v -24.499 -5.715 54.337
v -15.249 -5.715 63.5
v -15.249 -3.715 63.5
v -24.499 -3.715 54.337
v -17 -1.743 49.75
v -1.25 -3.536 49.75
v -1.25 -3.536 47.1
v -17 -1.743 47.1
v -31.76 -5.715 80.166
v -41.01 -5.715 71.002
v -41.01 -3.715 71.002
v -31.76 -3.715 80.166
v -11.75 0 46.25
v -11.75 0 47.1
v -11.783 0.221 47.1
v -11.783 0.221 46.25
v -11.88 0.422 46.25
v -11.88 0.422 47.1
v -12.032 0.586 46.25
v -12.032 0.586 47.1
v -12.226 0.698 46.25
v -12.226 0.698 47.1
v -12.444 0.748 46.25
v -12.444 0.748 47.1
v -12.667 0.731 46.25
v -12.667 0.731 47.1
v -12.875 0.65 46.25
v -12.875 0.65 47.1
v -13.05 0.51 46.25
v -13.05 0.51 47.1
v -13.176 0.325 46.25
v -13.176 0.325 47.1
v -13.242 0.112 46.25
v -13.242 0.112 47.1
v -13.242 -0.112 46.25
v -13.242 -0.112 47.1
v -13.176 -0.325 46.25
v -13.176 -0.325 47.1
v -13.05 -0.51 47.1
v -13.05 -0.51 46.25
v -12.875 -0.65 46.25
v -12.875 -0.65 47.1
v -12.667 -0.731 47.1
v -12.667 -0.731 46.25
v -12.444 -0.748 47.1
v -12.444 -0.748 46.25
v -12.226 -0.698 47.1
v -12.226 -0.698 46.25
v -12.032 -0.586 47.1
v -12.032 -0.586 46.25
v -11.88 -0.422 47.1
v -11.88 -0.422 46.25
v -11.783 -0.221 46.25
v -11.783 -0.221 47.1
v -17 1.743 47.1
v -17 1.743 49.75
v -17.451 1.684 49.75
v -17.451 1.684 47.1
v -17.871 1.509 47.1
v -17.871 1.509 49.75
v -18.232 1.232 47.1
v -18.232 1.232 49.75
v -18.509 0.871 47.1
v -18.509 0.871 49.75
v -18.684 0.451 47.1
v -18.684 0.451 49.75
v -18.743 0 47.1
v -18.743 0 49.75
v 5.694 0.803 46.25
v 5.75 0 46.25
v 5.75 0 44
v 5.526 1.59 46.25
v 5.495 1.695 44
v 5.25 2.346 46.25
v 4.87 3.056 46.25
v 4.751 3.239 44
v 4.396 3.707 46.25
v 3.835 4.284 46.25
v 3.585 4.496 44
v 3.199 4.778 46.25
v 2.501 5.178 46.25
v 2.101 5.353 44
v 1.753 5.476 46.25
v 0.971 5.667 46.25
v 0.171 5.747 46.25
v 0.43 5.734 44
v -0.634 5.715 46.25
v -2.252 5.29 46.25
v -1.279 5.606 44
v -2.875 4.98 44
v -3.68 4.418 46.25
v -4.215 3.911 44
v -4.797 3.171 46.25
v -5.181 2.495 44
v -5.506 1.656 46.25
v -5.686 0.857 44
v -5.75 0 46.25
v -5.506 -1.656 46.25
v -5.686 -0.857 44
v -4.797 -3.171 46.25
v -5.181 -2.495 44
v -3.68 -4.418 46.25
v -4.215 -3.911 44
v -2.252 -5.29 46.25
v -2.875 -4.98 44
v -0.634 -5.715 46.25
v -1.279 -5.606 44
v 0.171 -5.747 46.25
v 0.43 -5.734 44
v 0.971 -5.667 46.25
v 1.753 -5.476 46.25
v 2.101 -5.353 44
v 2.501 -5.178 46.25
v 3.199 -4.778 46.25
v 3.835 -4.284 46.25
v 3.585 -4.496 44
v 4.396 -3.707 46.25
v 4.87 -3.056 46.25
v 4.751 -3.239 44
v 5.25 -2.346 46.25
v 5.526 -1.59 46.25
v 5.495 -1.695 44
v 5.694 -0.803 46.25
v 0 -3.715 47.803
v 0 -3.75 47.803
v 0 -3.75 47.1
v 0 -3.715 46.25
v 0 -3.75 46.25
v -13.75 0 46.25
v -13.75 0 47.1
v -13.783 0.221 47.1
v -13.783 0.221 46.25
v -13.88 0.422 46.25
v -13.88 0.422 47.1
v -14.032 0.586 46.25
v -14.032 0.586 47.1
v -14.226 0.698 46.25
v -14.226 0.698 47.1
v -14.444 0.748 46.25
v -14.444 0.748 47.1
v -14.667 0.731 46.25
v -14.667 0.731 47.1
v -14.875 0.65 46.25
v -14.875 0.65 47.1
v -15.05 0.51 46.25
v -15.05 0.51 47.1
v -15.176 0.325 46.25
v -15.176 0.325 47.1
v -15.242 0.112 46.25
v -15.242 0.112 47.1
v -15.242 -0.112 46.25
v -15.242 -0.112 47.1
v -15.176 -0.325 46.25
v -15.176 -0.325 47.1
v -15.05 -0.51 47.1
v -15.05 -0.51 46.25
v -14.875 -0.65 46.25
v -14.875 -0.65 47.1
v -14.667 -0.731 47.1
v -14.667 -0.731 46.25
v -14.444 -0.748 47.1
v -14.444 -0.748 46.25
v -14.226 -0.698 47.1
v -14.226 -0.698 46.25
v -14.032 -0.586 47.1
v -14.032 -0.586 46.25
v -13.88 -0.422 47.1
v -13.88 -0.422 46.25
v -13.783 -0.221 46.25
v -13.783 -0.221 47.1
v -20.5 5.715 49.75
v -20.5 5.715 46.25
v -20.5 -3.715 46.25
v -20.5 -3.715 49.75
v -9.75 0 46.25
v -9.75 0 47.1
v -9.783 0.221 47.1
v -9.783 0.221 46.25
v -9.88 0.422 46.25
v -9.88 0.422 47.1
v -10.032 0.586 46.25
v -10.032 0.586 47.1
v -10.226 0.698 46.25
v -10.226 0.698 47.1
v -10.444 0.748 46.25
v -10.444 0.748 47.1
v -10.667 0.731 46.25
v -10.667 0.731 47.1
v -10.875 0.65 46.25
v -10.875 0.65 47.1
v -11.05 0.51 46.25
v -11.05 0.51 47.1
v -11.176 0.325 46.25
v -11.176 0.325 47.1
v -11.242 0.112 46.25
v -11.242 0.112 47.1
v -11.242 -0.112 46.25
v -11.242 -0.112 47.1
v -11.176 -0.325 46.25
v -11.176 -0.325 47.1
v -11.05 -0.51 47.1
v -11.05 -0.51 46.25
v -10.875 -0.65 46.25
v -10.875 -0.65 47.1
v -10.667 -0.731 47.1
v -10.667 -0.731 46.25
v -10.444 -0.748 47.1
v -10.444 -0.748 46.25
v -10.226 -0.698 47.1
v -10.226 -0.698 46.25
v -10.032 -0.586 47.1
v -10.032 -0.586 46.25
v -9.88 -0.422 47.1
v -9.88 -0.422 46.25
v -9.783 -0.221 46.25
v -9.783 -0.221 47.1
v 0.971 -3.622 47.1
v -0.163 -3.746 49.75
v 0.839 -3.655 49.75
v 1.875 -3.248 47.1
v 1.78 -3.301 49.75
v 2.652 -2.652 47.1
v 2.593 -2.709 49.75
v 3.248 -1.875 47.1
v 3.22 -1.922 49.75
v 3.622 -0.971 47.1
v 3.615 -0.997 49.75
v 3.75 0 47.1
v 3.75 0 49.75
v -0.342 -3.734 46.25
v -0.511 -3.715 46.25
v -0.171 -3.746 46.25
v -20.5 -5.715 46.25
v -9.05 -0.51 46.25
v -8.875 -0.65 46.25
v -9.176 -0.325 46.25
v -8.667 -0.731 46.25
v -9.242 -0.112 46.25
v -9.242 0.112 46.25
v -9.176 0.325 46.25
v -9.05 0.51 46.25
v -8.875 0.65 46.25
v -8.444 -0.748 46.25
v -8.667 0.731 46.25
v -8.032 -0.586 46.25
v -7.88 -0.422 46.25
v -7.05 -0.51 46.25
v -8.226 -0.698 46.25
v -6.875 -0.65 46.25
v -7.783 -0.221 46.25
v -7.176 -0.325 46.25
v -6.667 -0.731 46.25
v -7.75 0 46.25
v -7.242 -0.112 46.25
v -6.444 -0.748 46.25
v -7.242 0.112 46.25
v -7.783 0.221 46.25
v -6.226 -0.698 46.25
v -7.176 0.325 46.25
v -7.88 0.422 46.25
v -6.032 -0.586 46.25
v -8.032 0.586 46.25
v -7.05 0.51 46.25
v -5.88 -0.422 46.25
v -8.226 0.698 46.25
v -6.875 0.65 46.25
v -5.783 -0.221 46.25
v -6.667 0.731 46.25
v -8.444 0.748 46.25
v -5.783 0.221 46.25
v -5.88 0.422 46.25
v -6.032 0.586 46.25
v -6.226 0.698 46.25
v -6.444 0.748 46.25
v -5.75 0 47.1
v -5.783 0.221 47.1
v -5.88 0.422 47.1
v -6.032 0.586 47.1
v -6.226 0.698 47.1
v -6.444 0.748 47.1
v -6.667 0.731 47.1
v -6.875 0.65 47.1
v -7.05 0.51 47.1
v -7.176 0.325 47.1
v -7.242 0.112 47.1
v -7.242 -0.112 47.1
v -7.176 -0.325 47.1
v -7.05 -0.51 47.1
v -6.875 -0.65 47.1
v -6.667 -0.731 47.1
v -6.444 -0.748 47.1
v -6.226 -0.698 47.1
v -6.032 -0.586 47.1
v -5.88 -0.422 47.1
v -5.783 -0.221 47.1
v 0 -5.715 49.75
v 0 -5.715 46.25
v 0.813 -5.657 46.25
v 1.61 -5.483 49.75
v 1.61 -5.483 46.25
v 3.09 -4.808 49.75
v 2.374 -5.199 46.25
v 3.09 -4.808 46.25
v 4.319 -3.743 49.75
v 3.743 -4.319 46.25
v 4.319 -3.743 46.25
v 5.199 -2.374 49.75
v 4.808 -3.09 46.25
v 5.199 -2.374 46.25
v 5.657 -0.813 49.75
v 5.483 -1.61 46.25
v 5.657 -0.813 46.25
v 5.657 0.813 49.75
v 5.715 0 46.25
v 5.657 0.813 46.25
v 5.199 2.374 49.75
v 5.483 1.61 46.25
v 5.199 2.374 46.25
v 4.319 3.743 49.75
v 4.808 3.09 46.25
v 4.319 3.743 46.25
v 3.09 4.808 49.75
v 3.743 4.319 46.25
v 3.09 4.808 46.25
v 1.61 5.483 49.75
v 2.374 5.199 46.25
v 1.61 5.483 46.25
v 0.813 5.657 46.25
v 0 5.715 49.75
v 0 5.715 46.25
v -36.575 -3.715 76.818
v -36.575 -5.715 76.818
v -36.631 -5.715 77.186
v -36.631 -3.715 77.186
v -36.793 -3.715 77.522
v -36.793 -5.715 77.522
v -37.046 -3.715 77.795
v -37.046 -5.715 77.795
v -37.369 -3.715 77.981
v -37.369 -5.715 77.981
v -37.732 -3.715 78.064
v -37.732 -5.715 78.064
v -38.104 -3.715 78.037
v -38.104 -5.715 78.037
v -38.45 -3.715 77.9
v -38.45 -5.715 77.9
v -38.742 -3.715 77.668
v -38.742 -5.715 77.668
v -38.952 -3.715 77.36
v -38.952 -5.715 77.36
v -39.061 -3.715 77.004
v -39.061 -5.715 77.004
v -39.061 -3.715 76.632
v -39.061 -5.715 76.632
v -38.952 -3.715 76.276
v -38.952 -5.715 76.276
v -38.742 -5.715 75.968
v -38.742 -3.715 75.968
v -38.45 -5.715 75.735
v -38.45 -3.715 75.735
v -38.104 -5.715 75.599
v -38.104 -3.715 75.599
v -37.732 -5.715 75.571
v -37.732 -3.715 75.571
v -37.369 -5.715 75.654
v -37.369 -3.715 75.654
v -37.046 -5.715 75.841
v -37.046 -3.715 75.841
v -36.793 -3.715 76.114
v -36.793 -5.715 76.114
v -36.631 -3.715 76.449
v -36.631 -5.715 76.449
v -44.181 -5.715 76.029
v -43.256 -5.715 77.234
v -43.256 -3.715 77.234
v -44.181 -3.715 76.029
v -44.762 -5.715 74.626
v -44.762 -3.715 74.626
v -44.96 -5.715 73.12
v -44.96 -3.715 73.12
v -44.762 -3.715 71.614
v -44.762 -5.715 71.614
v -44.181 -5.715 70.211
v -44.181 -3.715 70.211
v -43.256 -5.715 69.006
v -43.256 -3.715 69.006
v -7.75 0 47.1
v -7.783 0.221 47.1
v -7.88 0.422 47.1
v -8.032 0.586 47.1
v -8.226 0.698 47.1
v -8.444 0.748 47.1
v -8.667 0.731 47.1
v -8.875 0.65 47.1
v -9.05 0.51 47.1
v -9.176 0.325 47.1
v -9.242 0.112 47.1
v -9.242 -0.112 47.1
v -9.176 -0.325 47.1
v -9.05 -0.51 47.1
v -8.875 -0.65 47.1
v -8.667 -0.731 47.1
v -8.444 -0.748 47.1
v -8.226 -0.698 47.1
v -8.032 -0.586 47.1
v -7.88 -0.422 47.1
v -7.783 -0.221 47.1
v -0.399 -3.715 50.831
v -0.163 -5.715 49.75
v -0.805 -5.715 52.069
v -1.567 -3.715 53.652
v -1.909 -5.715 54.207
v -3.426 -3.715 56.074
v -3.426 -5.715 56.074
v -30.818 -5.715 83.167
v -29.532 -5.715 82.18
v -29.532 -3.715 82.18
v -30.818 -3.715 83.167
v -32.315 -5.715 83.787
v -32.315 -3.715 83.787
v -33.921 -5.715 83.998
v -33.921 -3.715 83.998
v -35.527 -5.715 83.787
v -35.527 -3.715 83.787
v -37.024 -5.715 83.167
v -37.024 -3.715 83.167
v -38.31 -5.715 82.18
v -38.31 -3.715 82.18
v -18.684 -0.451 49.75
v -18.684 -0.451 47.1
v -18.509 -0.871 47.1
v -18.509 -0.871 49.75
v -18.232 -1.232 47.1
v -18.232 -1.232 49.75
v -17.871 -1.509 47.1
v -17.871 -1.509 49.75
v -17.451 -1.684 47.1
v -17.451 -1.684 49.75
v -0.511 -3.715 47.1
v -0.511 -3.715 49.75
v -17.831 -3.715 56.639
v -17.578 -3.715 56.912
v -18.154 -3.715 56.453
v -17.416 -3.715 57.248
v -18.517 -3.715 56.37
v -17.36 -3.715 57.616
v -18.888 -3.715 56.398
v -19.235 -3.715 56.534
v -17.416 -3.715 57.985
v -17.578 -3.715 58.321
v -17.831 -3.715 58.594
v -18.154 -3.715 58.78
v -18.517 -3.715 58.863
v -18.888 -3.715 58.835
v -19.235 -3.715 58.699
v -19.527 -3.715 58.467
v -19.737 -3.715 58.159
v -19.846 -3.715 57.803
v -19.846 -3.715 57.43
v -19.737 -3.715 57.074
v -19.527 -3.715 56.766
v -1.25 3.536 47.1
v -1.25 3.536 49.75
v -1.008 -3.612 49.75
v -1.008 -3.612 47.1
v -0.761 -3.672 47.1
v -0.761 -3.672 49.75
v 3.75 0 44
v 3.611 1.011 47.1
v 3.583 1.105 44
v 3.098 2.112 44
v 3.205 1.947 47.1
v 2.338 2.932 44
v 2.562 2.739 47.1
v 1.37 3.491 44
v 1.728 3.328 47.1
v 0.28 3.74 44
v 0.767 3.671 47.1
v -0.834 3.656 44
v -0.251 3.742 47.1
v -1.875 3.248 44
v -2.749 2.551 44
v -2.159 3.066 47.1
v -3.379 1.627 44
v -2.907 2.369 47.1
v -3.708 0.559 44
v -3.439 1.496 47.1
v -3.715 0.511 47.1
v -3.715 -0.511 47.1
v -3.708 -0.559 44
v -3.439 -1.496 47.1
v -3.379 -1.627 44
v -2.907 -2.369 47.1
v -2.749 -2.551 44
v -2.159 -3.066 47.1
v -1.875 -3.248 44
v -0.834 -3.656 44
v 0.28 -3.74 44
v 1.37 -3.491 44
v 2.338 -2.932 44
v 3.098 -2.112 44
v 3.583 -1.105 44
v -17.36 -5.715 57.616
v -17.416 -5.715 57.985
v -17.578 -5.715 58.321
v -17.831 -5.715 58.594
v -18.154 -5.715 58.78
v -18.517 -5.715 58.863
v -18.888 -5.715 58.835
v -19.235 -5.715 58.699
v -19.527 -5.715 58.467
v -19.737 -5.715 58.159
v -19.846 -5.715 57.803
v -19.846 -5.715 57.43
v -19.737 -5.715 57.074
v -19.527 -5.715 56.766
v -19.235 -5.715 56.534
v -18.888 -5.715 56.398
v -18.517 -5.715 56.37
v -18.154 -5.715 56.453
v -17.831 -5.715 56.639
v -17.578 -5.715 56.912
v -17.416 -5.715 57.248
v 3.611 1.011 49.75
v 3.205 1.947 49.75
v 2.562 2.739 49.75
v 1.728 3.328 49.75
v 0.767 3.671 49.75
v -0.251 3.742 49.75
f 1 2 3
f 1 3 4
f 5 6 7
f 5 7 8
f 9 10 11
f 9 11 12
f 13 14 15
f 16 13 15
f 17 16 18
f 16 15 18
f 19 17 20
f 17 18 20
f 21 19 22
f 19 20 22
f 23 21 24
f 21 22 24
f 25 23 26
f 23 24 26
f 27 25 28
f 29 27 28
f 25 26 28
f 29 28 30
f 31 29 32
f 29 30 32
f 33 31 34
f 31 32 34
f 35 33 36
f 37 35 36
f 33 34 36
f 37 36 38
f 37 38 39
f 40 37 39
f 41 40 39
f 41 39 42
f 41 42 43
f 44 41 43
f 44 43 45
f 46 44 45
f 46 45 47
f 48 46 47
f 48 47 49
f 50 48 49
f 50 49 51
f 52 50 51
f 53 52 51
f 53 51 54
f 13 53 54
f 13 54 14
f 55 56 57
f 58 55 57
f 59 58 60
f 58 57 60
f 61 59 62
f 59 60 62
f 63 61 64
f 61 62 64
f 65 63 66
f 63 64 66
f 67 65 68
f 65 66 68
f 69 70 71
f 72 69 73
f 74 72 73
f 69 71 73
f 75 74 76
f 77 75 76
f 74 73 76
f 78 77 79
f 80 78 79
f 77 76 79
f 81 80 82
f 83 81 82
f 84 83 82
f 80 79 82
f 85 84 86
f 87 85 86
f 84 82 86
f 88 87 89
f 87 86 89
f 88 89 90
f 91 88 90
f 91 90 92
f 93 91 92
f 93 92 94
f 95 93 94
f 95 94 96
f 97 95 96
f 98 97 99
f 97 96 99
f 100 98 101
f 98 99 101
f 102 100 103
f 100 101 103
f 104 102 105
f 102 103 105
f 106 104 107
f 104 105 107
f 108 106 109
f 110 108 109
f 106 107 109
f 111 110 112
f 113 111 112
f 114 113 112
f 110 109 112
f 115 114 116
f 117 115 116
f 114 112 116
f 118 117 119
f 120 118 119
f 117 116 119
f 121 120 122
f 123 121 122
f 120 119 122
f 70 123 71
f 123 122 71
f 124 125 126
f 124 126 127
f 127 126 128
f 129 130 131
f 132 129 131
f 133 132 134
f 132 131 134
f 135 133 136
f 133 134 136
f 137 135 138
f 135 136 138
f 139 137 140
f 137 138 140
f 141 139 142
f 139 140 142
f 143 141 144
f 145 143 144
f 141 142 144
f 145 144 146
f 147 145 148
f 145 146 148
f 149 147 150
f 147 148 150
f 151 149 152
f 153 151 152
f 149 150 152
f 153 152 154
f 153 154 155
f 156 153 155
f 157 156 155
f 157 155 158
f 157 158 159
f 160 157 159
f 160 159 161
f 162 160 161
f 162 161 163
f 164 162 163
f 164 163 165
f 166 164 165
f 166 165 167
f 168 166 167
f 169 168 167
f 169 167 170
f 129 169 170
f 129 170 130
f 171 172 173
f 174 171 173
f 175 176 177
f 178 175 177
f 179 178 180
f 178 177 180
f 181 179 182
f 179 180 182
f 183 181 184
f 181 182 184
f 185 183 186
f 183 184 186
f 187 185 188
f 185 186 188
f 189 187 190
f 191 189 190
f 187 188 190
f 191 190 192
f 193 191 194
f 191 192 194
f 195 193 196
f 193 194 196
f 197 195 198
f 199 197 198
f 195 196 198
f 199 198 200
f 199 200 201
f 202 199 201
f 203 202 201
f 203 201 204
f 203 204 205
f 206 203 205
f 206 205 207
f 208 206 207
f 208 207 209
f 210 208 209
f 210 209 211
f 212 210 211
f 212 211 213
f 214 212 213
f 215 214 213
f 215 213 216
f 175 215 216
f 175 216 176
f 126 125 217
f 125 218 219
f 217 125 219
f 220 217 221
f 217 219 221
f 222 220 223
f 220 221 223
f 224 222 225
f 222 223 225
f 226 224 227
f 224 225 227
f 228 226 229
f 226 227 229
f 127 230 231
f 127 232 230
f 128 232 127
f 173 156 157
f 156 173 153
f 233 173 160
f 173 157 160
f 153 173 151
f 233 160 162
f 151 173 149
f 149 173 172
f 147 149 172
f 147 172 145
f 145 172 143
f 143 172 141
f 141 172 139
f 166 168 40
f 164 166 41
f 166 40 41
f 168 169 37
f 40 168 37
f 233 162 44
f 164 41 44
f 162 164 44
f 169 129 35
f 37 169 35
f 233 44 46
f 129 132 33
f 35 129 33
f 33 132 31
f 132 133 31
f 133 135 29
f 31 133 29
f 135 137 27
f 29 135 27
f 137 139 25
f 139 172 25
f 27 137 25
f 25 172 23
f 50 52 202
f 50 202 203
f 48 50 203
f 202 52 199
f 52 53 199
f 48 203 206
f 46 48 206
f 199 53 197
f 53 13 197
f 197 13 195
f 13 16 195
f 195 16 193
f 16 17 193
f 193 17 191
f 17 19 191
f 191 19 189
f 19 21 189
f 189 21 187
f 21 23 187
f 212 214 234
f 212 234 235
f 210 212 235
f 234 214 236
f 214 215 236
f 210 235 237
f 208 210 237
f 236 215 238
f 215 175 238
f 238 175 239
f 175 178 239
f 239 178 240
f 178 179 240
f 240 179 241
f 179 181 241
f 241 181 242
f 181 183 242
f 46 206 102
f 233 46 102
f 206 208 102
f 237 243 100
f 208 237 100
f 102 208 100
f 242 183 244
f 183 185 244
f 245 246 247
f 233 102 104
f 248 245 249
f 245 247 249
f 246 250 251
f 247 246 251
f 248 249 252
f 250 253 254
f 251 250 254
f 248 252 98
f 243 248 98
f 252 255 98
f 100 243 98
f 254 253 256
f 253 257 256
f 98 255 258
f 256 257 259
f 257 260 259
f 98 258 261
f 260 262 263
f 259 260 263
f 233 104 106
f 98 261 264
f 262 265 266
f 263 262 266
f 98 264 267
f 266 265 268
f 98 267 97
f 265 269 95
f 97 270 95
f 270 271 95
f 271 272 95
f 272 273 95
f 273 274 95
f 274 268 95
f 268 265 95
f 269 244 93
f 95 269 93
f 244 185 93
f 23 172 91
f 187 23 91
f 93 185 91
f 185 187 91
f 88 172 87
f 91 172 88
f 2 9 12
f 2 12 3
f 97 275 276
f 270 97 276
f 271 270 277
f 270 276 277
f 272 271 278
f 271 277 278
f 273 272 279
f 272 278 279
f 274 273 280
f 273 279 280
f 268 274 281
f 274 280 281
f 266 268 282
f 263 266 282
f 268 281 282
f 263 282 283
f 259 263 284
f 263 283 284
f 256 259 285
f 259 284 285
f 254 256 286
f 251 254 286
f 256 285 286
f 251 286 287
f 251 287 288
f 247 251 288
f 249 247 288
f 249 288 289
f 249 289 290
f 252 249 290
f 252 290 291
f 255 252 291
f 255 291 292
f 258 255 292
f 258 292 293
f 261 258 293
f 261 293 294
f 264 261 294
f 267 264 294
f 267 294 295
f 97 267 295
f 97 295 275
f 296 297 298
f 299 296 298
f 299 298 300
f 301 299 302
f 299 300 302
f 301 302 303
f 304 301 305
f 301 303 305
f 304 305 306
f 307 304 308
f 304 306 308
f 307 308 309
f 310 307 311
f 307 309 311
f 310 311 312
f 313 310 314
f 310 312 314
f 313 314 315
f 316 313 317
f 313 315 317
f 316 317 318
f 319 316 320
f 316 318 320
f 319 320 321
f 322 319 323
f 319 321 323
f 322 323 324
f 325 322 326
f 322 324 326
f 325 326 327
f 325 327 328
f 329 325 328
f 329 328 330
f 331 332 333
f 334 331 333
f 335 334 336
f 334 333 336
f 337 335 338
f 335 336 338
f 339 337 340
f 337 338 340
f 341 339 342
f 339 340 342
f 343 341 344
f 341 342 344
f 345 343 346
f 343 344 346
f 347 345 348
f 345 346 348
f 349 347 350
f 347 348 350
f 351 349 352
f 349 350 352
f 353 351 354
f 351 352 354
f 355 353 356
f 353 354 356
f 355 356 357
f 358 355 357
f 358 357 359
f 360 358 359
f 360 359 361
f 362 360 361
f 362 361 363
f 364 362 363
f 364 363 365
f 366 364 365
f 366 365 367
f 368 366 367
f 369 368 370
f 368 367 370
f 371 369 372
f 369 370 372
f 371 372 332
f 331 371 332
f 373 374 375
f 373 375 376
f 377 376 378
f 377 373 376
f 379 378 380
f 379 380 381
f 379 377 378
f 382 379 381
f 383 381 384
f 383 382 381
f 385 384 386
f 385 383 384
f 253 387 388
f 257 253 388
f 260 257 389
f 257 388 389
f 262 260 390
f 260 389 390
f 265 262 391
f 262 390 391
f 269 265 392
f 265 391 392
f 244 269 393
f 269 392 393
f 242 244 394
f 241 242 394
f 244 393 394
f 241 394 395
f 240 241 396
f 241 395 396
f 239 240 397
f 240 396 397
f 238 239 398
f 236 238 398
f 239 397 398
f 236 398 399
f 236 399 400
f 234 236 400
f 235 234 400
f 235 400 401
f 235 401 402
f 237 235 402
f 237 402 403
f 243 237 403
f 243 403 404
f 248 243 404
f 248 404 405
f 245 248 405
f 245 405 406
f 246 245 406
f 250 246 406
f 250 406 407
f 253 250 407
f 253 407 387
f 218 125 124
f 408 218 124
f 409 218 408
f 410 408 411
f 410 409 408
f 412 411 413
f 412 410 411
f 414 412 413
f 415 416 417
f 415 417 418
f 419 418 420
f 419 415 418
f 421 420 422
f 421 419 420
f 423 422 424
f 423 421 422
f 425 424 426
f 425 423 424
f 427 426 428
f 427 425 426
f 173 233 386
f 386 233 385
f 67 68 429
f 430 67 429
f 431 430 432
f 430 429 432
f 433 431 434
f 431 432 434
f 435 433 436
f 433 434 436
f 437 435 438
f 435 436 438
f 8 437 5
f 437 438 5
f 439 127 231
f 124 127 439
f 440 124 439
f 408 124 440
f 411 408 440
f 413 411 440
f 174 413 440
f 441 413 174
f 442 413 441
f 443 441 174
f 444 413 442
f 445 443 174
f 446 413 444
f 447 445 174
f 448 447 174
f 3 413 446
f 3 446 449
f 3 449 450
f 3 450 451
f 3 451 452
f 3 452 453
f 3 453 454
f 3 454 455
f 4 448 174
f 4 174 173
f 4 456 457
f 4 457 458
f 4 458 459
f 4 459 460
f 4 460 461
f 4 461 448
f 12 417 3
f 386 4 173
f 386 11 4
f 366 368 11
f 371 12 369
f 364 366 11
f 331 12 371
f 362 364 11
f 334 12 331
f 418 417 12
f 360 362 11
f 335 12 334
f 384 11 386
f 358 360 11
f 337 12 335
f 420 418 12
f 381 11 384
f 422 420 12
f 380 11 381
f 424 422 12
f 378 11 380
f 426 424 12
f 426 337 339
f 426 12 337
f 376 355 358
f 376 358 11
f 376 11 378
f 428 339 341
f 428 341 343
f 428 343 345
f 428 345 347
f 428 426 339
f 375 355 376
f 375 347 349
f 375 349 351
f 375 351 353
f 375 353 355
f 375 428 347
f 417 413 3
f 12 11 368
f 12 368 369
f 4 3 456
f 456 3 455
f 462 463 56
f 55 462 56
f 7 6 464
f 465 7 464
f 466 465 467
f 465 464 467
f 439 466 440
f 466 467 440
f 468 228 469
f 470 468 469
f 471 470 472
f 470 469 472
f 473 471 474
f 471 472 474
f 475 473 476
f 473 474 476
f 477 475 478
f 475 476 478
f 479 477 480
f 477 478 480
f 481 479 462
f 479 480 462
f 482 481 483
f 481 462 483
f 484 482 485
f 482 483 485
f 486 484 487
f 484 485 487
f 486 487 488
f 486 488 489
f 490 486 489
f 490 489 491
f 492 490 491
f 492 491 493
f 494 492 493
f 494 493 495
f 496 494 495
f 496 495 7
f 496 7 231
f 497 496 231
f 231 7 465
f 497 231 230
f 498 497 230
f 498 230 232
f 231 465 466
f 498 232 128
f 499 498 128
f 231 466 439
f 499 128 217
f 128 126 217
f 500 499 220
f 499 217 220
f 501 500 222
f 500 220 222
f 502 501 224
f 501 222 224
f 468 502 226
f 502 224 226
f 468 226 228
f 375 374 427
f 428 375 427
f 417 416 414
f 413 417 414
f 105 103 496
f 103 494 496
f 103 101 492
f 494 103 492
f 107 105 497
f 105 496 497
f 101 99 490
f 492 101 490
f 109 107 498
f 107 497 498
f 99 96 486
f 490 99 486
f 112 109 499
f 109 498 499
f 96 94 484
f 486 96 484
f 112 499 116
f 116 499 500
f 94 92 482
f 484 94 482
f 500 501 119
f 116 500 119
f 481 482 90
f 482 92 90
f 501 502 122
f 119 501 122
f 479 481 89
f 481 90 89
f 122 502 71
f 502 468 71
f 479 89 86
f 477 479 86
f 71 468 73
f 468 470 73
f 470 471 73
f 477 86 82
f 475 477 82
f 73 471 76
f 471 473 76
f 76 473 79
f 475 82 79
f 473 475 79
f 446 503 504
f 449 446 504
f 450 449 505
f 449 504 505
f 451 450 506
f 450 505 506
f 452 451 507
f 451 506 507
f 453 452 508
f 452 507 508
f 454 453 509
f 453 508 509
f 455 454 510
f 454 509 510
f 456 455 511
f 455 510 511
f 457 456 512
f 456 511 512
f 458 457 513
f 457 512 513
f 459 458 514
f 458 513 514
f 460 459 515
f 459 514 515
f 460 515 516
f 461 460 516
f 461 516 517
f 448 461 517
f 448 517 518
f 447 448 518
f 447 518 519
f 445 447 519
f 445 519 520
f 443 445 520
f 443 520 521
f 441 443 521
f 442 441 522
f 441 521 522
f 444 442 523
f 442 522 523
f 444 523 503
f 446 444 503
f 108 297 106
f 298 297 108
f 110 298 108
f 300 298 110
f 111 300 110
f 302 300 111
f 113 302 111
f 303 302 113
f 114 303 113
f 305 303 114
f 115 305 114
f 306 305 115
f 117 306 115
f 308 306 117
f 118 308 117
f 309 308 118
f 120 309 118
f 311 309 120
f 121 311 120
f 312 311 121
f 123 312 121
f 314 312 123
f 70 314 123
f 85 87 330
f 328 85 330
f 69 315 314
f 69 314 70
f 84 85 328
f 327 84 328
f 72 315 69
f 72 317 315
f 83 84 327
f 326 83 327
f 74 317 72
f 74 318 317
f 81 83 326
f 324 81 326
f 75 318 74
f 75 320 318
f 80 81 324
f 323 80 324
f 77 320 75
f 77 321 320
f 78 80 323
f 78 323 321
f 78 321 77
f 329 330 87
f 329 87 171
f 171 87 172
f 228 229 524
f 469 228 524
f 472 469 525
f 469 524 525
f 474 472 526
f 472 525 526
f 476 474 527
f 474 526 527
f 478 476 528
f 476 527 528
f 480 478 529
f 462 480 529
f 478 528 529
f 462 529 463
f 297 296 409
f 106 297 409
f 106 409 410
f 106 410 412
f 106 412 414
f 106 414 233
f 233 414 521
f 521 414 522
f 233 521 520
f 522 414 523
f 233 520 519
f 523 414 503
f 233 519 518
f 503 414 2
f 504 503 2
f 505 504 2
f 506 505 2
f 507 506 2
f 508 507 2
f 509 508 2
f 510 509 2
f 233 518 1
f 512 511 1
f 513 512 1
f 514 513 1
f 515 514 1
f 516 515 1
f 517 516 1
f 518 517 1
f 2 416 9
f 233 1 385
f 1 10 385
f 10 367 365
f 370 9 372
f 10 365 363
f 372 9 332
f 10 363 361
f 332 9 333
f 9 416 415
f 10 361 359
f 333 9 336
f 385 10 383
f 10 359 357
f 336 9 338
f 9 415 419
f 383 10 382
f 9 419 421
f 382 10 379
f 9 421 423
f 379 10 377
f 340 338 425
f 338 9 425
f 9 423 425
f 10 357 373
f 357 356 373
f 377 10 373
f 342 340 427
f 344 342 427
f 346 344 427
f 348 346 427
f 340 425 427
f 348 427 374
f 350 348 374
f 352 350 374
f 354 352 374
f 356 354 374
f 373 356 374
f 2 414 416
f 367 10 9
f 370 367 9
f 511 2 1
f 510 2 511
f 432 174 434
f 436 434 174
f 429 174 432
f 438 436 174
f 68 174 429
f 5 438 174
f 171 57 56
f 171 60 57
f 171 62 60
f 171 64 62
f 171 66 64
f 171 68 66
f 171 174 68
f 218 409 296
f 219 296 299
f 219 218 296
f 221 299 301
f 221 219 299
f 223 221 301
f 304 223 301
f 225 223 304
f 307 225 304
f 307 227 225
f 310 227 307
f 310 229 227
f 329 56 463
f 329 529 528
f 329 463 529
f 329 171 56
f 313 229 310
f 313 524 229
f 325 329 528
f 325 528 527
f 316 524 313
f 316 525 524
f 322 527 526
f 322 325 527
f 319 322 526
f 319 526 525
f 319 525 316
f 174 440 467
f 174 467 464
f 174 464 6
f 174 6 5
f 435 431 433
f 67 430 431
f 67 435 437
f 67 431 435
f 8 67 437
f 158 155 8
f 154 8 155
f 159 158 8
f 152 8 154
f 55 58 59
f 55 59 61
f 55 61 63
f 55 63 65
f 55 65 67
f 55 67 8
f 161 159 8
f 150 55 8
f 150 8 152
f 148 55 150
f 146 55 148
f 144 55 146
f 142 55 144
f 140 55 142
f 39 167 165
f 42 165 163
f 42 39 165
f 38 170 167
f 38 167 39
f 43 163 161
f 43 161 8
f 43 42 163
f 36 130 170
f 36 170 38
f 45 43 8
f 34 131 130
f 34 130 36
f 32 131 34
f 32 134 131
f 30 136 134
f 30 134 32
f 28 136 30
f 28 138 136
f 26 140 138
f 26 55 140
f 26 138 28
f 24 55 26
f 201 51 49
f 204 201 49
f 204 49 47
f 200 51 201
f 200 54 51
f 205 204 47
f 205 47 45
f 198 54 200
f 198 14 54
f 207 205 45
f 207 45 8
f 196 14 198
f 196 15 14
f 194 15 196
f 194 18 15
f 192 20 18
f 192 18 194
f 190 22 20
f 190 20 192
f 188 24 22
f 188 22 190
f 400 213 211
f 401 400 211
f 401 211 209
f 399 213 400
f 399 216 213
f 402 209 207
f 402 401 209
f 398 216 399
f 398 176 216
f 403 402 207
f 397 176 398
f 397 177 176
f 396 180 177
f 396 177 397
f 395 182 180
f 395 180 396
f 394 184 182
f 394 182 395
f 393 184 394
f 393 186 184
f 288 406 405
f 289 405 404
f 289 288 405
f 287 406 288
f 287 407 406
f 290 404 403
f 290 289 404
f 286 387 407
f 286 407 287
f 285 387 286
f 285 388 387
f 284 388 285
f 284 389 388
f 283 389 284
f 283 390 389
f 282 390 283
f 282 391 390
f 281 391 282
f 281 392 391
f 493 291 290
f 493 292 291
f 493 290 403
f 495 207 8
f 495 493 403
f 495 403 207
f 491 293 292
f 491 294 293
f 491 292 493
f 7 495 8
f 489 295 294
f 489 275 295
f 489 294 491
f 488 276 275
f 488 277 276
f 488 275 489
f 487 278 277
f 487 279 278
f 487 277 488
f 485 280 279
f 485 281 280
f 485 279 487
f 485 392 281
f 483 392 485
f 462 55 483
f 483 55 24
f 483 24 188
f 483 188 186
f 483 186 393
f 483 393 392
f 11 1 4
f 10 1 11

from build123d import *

# Parameters (mm, degrees)
SKETCH045_R        = 5.75
SKETCH045_R_2      = 3.75
PAD013_DEPTH       = 2.25
PAD014_DEPTH       = 3.5
POCKET003048_DEPTH = 2.65
SKETCH048_R        = 3.75
SKETCH048_R_2      = 0.75
POCKET003049_DEPTH = 5
SKETCH050_R        = 1.25
PAD015_DEPTH       = 2


with BuildPart() as part:
    # Sketch045 → Pad013 (new body)
    with BuildSketch(Plane.XY):
        Circle(SKETCH045_R)
        Circle(SKETCH045_R_2, mode=Mode.SUBTRACT)
    extrude(amount=PAD013_DEPTH)

    # Sketch047 (on Face4 of Pad013) → Pad014 (join)
    with BuildSketch(Plane.XY.offset(2.25)):
        with BuildLine():
            Line((0, 5.714965), (-20.5, 5.714965))
            Line((-20.5, 5.714965), (-20.5, -5.714965))
            Line((0, -5.714965), (-20.5, -5.714965))
            ThreePointArc((0, -5.714965), (5.714965, 0), (0, 5.714965))
        make_face()
    extrude(amount=PAD014_DEPTH)

    # Sketch046 (on Face11 of Pad014) → Pocket003048 (cut)
    with BuildSketch(Plane.XY.offset(5.75)):
        with BuildLine():
            Line((-1.25, 3.535534), (-16.999999, 1.742953))
            ThreePointArc((-16.999999, 1.742953), (-18.232454, 1.232454), (-18.742953, 0))
            ThreePointArc((-18.742953, 0), (-18.232454, -1.232454), (-16.999999, -1.742953))
            Line((-1.25, -3.535534), (-16.999999, -1.742953))
            ThreePointArc((-1.25, -3.535534), (2.165064, -3.061862), (3.75, 0))
            ThreePointArc((3.75, 0), (2.165064, 3.061862), (-1.25, 3.535534))
        make_face()
    extrude(amount=-POCKET003048_DEPTH, mode=Mode.SUBTRACT)

    # Sketch048 (on Face16 of Pocket003048) → Pocket003049 (cut)
    with BuildSketch(Plane.XY.offset(3.1)):
        Circle(SKETCH048_R)
        with Locations((-14.5, 0)):
            Circle(SKETCH048_R_2)
        with Locations((-12.5, 0)):
            Circle(SKETCH048_R_2)
        with Locations((-10.5, 0)):
            Circle(SKETCH048_R_2)
        with Locations((-8.5, 0)):
            Circle(SKETCH048_R_2)
        with Locations((-6.5, 0)):
            Circle(SKETCH048_R_2)
    extrude(amount=-POCKET003049_DEPTH, mode=Mode.SUBTRACT)

    # Sketch050 (on Face2 of Pocket003049) → Pad015 (join)
    with BuildSketch(Plane.XZ.offset(5.714965)):
        with BuildLine():
            Line((-20.5, 2.25), (-43.255932, 25.005932))
            ThreePointArc((-43.255932, 33.234184), (-44.960058, 29.120058), (-43.255932, 25.005932))
            Line((-43.255932, 33.234184), (-38.30976, 38.180356))
            ThreePointArc((-29.532214, 38.180356), (-33.920987, 39.998245), (-38.30976, 38.180356))
            Line((-29.532214, 38.180356), (-3.425929, 12.074071))
            ThreePointArc((0, 3.803146), (-0.89037, 8.279338), (-3.425929, 12.074071))
            Line((0, 3.803146), (0, 2.25))
            Line((-20.5, 2.25), (0, 2.25))
        make_face()
        with Locations((-37.825367, 32.817886)):
            Circle(SKETCH050_R, mode=Mode.SUBTRACT)
        with Locations((-18.610336, 13.616402)):
            Circle(SKETCH050_R, mode=Mode.SUBTRACT)
        Polygon((-41.009785, 27.002425), (-31.760418, 36.165919), (-15.249238, 19.500009), (-24.498605, 10.336516), align=None, mode=Mode.SUBTRACT)
    extrude(amount=-PAD015_DEPTH)


with BuildPart() as part_1:
    # Body009 placement: moved
    add(part.part.moved(Location((0, 0, 44))))


solid = part_1.part
